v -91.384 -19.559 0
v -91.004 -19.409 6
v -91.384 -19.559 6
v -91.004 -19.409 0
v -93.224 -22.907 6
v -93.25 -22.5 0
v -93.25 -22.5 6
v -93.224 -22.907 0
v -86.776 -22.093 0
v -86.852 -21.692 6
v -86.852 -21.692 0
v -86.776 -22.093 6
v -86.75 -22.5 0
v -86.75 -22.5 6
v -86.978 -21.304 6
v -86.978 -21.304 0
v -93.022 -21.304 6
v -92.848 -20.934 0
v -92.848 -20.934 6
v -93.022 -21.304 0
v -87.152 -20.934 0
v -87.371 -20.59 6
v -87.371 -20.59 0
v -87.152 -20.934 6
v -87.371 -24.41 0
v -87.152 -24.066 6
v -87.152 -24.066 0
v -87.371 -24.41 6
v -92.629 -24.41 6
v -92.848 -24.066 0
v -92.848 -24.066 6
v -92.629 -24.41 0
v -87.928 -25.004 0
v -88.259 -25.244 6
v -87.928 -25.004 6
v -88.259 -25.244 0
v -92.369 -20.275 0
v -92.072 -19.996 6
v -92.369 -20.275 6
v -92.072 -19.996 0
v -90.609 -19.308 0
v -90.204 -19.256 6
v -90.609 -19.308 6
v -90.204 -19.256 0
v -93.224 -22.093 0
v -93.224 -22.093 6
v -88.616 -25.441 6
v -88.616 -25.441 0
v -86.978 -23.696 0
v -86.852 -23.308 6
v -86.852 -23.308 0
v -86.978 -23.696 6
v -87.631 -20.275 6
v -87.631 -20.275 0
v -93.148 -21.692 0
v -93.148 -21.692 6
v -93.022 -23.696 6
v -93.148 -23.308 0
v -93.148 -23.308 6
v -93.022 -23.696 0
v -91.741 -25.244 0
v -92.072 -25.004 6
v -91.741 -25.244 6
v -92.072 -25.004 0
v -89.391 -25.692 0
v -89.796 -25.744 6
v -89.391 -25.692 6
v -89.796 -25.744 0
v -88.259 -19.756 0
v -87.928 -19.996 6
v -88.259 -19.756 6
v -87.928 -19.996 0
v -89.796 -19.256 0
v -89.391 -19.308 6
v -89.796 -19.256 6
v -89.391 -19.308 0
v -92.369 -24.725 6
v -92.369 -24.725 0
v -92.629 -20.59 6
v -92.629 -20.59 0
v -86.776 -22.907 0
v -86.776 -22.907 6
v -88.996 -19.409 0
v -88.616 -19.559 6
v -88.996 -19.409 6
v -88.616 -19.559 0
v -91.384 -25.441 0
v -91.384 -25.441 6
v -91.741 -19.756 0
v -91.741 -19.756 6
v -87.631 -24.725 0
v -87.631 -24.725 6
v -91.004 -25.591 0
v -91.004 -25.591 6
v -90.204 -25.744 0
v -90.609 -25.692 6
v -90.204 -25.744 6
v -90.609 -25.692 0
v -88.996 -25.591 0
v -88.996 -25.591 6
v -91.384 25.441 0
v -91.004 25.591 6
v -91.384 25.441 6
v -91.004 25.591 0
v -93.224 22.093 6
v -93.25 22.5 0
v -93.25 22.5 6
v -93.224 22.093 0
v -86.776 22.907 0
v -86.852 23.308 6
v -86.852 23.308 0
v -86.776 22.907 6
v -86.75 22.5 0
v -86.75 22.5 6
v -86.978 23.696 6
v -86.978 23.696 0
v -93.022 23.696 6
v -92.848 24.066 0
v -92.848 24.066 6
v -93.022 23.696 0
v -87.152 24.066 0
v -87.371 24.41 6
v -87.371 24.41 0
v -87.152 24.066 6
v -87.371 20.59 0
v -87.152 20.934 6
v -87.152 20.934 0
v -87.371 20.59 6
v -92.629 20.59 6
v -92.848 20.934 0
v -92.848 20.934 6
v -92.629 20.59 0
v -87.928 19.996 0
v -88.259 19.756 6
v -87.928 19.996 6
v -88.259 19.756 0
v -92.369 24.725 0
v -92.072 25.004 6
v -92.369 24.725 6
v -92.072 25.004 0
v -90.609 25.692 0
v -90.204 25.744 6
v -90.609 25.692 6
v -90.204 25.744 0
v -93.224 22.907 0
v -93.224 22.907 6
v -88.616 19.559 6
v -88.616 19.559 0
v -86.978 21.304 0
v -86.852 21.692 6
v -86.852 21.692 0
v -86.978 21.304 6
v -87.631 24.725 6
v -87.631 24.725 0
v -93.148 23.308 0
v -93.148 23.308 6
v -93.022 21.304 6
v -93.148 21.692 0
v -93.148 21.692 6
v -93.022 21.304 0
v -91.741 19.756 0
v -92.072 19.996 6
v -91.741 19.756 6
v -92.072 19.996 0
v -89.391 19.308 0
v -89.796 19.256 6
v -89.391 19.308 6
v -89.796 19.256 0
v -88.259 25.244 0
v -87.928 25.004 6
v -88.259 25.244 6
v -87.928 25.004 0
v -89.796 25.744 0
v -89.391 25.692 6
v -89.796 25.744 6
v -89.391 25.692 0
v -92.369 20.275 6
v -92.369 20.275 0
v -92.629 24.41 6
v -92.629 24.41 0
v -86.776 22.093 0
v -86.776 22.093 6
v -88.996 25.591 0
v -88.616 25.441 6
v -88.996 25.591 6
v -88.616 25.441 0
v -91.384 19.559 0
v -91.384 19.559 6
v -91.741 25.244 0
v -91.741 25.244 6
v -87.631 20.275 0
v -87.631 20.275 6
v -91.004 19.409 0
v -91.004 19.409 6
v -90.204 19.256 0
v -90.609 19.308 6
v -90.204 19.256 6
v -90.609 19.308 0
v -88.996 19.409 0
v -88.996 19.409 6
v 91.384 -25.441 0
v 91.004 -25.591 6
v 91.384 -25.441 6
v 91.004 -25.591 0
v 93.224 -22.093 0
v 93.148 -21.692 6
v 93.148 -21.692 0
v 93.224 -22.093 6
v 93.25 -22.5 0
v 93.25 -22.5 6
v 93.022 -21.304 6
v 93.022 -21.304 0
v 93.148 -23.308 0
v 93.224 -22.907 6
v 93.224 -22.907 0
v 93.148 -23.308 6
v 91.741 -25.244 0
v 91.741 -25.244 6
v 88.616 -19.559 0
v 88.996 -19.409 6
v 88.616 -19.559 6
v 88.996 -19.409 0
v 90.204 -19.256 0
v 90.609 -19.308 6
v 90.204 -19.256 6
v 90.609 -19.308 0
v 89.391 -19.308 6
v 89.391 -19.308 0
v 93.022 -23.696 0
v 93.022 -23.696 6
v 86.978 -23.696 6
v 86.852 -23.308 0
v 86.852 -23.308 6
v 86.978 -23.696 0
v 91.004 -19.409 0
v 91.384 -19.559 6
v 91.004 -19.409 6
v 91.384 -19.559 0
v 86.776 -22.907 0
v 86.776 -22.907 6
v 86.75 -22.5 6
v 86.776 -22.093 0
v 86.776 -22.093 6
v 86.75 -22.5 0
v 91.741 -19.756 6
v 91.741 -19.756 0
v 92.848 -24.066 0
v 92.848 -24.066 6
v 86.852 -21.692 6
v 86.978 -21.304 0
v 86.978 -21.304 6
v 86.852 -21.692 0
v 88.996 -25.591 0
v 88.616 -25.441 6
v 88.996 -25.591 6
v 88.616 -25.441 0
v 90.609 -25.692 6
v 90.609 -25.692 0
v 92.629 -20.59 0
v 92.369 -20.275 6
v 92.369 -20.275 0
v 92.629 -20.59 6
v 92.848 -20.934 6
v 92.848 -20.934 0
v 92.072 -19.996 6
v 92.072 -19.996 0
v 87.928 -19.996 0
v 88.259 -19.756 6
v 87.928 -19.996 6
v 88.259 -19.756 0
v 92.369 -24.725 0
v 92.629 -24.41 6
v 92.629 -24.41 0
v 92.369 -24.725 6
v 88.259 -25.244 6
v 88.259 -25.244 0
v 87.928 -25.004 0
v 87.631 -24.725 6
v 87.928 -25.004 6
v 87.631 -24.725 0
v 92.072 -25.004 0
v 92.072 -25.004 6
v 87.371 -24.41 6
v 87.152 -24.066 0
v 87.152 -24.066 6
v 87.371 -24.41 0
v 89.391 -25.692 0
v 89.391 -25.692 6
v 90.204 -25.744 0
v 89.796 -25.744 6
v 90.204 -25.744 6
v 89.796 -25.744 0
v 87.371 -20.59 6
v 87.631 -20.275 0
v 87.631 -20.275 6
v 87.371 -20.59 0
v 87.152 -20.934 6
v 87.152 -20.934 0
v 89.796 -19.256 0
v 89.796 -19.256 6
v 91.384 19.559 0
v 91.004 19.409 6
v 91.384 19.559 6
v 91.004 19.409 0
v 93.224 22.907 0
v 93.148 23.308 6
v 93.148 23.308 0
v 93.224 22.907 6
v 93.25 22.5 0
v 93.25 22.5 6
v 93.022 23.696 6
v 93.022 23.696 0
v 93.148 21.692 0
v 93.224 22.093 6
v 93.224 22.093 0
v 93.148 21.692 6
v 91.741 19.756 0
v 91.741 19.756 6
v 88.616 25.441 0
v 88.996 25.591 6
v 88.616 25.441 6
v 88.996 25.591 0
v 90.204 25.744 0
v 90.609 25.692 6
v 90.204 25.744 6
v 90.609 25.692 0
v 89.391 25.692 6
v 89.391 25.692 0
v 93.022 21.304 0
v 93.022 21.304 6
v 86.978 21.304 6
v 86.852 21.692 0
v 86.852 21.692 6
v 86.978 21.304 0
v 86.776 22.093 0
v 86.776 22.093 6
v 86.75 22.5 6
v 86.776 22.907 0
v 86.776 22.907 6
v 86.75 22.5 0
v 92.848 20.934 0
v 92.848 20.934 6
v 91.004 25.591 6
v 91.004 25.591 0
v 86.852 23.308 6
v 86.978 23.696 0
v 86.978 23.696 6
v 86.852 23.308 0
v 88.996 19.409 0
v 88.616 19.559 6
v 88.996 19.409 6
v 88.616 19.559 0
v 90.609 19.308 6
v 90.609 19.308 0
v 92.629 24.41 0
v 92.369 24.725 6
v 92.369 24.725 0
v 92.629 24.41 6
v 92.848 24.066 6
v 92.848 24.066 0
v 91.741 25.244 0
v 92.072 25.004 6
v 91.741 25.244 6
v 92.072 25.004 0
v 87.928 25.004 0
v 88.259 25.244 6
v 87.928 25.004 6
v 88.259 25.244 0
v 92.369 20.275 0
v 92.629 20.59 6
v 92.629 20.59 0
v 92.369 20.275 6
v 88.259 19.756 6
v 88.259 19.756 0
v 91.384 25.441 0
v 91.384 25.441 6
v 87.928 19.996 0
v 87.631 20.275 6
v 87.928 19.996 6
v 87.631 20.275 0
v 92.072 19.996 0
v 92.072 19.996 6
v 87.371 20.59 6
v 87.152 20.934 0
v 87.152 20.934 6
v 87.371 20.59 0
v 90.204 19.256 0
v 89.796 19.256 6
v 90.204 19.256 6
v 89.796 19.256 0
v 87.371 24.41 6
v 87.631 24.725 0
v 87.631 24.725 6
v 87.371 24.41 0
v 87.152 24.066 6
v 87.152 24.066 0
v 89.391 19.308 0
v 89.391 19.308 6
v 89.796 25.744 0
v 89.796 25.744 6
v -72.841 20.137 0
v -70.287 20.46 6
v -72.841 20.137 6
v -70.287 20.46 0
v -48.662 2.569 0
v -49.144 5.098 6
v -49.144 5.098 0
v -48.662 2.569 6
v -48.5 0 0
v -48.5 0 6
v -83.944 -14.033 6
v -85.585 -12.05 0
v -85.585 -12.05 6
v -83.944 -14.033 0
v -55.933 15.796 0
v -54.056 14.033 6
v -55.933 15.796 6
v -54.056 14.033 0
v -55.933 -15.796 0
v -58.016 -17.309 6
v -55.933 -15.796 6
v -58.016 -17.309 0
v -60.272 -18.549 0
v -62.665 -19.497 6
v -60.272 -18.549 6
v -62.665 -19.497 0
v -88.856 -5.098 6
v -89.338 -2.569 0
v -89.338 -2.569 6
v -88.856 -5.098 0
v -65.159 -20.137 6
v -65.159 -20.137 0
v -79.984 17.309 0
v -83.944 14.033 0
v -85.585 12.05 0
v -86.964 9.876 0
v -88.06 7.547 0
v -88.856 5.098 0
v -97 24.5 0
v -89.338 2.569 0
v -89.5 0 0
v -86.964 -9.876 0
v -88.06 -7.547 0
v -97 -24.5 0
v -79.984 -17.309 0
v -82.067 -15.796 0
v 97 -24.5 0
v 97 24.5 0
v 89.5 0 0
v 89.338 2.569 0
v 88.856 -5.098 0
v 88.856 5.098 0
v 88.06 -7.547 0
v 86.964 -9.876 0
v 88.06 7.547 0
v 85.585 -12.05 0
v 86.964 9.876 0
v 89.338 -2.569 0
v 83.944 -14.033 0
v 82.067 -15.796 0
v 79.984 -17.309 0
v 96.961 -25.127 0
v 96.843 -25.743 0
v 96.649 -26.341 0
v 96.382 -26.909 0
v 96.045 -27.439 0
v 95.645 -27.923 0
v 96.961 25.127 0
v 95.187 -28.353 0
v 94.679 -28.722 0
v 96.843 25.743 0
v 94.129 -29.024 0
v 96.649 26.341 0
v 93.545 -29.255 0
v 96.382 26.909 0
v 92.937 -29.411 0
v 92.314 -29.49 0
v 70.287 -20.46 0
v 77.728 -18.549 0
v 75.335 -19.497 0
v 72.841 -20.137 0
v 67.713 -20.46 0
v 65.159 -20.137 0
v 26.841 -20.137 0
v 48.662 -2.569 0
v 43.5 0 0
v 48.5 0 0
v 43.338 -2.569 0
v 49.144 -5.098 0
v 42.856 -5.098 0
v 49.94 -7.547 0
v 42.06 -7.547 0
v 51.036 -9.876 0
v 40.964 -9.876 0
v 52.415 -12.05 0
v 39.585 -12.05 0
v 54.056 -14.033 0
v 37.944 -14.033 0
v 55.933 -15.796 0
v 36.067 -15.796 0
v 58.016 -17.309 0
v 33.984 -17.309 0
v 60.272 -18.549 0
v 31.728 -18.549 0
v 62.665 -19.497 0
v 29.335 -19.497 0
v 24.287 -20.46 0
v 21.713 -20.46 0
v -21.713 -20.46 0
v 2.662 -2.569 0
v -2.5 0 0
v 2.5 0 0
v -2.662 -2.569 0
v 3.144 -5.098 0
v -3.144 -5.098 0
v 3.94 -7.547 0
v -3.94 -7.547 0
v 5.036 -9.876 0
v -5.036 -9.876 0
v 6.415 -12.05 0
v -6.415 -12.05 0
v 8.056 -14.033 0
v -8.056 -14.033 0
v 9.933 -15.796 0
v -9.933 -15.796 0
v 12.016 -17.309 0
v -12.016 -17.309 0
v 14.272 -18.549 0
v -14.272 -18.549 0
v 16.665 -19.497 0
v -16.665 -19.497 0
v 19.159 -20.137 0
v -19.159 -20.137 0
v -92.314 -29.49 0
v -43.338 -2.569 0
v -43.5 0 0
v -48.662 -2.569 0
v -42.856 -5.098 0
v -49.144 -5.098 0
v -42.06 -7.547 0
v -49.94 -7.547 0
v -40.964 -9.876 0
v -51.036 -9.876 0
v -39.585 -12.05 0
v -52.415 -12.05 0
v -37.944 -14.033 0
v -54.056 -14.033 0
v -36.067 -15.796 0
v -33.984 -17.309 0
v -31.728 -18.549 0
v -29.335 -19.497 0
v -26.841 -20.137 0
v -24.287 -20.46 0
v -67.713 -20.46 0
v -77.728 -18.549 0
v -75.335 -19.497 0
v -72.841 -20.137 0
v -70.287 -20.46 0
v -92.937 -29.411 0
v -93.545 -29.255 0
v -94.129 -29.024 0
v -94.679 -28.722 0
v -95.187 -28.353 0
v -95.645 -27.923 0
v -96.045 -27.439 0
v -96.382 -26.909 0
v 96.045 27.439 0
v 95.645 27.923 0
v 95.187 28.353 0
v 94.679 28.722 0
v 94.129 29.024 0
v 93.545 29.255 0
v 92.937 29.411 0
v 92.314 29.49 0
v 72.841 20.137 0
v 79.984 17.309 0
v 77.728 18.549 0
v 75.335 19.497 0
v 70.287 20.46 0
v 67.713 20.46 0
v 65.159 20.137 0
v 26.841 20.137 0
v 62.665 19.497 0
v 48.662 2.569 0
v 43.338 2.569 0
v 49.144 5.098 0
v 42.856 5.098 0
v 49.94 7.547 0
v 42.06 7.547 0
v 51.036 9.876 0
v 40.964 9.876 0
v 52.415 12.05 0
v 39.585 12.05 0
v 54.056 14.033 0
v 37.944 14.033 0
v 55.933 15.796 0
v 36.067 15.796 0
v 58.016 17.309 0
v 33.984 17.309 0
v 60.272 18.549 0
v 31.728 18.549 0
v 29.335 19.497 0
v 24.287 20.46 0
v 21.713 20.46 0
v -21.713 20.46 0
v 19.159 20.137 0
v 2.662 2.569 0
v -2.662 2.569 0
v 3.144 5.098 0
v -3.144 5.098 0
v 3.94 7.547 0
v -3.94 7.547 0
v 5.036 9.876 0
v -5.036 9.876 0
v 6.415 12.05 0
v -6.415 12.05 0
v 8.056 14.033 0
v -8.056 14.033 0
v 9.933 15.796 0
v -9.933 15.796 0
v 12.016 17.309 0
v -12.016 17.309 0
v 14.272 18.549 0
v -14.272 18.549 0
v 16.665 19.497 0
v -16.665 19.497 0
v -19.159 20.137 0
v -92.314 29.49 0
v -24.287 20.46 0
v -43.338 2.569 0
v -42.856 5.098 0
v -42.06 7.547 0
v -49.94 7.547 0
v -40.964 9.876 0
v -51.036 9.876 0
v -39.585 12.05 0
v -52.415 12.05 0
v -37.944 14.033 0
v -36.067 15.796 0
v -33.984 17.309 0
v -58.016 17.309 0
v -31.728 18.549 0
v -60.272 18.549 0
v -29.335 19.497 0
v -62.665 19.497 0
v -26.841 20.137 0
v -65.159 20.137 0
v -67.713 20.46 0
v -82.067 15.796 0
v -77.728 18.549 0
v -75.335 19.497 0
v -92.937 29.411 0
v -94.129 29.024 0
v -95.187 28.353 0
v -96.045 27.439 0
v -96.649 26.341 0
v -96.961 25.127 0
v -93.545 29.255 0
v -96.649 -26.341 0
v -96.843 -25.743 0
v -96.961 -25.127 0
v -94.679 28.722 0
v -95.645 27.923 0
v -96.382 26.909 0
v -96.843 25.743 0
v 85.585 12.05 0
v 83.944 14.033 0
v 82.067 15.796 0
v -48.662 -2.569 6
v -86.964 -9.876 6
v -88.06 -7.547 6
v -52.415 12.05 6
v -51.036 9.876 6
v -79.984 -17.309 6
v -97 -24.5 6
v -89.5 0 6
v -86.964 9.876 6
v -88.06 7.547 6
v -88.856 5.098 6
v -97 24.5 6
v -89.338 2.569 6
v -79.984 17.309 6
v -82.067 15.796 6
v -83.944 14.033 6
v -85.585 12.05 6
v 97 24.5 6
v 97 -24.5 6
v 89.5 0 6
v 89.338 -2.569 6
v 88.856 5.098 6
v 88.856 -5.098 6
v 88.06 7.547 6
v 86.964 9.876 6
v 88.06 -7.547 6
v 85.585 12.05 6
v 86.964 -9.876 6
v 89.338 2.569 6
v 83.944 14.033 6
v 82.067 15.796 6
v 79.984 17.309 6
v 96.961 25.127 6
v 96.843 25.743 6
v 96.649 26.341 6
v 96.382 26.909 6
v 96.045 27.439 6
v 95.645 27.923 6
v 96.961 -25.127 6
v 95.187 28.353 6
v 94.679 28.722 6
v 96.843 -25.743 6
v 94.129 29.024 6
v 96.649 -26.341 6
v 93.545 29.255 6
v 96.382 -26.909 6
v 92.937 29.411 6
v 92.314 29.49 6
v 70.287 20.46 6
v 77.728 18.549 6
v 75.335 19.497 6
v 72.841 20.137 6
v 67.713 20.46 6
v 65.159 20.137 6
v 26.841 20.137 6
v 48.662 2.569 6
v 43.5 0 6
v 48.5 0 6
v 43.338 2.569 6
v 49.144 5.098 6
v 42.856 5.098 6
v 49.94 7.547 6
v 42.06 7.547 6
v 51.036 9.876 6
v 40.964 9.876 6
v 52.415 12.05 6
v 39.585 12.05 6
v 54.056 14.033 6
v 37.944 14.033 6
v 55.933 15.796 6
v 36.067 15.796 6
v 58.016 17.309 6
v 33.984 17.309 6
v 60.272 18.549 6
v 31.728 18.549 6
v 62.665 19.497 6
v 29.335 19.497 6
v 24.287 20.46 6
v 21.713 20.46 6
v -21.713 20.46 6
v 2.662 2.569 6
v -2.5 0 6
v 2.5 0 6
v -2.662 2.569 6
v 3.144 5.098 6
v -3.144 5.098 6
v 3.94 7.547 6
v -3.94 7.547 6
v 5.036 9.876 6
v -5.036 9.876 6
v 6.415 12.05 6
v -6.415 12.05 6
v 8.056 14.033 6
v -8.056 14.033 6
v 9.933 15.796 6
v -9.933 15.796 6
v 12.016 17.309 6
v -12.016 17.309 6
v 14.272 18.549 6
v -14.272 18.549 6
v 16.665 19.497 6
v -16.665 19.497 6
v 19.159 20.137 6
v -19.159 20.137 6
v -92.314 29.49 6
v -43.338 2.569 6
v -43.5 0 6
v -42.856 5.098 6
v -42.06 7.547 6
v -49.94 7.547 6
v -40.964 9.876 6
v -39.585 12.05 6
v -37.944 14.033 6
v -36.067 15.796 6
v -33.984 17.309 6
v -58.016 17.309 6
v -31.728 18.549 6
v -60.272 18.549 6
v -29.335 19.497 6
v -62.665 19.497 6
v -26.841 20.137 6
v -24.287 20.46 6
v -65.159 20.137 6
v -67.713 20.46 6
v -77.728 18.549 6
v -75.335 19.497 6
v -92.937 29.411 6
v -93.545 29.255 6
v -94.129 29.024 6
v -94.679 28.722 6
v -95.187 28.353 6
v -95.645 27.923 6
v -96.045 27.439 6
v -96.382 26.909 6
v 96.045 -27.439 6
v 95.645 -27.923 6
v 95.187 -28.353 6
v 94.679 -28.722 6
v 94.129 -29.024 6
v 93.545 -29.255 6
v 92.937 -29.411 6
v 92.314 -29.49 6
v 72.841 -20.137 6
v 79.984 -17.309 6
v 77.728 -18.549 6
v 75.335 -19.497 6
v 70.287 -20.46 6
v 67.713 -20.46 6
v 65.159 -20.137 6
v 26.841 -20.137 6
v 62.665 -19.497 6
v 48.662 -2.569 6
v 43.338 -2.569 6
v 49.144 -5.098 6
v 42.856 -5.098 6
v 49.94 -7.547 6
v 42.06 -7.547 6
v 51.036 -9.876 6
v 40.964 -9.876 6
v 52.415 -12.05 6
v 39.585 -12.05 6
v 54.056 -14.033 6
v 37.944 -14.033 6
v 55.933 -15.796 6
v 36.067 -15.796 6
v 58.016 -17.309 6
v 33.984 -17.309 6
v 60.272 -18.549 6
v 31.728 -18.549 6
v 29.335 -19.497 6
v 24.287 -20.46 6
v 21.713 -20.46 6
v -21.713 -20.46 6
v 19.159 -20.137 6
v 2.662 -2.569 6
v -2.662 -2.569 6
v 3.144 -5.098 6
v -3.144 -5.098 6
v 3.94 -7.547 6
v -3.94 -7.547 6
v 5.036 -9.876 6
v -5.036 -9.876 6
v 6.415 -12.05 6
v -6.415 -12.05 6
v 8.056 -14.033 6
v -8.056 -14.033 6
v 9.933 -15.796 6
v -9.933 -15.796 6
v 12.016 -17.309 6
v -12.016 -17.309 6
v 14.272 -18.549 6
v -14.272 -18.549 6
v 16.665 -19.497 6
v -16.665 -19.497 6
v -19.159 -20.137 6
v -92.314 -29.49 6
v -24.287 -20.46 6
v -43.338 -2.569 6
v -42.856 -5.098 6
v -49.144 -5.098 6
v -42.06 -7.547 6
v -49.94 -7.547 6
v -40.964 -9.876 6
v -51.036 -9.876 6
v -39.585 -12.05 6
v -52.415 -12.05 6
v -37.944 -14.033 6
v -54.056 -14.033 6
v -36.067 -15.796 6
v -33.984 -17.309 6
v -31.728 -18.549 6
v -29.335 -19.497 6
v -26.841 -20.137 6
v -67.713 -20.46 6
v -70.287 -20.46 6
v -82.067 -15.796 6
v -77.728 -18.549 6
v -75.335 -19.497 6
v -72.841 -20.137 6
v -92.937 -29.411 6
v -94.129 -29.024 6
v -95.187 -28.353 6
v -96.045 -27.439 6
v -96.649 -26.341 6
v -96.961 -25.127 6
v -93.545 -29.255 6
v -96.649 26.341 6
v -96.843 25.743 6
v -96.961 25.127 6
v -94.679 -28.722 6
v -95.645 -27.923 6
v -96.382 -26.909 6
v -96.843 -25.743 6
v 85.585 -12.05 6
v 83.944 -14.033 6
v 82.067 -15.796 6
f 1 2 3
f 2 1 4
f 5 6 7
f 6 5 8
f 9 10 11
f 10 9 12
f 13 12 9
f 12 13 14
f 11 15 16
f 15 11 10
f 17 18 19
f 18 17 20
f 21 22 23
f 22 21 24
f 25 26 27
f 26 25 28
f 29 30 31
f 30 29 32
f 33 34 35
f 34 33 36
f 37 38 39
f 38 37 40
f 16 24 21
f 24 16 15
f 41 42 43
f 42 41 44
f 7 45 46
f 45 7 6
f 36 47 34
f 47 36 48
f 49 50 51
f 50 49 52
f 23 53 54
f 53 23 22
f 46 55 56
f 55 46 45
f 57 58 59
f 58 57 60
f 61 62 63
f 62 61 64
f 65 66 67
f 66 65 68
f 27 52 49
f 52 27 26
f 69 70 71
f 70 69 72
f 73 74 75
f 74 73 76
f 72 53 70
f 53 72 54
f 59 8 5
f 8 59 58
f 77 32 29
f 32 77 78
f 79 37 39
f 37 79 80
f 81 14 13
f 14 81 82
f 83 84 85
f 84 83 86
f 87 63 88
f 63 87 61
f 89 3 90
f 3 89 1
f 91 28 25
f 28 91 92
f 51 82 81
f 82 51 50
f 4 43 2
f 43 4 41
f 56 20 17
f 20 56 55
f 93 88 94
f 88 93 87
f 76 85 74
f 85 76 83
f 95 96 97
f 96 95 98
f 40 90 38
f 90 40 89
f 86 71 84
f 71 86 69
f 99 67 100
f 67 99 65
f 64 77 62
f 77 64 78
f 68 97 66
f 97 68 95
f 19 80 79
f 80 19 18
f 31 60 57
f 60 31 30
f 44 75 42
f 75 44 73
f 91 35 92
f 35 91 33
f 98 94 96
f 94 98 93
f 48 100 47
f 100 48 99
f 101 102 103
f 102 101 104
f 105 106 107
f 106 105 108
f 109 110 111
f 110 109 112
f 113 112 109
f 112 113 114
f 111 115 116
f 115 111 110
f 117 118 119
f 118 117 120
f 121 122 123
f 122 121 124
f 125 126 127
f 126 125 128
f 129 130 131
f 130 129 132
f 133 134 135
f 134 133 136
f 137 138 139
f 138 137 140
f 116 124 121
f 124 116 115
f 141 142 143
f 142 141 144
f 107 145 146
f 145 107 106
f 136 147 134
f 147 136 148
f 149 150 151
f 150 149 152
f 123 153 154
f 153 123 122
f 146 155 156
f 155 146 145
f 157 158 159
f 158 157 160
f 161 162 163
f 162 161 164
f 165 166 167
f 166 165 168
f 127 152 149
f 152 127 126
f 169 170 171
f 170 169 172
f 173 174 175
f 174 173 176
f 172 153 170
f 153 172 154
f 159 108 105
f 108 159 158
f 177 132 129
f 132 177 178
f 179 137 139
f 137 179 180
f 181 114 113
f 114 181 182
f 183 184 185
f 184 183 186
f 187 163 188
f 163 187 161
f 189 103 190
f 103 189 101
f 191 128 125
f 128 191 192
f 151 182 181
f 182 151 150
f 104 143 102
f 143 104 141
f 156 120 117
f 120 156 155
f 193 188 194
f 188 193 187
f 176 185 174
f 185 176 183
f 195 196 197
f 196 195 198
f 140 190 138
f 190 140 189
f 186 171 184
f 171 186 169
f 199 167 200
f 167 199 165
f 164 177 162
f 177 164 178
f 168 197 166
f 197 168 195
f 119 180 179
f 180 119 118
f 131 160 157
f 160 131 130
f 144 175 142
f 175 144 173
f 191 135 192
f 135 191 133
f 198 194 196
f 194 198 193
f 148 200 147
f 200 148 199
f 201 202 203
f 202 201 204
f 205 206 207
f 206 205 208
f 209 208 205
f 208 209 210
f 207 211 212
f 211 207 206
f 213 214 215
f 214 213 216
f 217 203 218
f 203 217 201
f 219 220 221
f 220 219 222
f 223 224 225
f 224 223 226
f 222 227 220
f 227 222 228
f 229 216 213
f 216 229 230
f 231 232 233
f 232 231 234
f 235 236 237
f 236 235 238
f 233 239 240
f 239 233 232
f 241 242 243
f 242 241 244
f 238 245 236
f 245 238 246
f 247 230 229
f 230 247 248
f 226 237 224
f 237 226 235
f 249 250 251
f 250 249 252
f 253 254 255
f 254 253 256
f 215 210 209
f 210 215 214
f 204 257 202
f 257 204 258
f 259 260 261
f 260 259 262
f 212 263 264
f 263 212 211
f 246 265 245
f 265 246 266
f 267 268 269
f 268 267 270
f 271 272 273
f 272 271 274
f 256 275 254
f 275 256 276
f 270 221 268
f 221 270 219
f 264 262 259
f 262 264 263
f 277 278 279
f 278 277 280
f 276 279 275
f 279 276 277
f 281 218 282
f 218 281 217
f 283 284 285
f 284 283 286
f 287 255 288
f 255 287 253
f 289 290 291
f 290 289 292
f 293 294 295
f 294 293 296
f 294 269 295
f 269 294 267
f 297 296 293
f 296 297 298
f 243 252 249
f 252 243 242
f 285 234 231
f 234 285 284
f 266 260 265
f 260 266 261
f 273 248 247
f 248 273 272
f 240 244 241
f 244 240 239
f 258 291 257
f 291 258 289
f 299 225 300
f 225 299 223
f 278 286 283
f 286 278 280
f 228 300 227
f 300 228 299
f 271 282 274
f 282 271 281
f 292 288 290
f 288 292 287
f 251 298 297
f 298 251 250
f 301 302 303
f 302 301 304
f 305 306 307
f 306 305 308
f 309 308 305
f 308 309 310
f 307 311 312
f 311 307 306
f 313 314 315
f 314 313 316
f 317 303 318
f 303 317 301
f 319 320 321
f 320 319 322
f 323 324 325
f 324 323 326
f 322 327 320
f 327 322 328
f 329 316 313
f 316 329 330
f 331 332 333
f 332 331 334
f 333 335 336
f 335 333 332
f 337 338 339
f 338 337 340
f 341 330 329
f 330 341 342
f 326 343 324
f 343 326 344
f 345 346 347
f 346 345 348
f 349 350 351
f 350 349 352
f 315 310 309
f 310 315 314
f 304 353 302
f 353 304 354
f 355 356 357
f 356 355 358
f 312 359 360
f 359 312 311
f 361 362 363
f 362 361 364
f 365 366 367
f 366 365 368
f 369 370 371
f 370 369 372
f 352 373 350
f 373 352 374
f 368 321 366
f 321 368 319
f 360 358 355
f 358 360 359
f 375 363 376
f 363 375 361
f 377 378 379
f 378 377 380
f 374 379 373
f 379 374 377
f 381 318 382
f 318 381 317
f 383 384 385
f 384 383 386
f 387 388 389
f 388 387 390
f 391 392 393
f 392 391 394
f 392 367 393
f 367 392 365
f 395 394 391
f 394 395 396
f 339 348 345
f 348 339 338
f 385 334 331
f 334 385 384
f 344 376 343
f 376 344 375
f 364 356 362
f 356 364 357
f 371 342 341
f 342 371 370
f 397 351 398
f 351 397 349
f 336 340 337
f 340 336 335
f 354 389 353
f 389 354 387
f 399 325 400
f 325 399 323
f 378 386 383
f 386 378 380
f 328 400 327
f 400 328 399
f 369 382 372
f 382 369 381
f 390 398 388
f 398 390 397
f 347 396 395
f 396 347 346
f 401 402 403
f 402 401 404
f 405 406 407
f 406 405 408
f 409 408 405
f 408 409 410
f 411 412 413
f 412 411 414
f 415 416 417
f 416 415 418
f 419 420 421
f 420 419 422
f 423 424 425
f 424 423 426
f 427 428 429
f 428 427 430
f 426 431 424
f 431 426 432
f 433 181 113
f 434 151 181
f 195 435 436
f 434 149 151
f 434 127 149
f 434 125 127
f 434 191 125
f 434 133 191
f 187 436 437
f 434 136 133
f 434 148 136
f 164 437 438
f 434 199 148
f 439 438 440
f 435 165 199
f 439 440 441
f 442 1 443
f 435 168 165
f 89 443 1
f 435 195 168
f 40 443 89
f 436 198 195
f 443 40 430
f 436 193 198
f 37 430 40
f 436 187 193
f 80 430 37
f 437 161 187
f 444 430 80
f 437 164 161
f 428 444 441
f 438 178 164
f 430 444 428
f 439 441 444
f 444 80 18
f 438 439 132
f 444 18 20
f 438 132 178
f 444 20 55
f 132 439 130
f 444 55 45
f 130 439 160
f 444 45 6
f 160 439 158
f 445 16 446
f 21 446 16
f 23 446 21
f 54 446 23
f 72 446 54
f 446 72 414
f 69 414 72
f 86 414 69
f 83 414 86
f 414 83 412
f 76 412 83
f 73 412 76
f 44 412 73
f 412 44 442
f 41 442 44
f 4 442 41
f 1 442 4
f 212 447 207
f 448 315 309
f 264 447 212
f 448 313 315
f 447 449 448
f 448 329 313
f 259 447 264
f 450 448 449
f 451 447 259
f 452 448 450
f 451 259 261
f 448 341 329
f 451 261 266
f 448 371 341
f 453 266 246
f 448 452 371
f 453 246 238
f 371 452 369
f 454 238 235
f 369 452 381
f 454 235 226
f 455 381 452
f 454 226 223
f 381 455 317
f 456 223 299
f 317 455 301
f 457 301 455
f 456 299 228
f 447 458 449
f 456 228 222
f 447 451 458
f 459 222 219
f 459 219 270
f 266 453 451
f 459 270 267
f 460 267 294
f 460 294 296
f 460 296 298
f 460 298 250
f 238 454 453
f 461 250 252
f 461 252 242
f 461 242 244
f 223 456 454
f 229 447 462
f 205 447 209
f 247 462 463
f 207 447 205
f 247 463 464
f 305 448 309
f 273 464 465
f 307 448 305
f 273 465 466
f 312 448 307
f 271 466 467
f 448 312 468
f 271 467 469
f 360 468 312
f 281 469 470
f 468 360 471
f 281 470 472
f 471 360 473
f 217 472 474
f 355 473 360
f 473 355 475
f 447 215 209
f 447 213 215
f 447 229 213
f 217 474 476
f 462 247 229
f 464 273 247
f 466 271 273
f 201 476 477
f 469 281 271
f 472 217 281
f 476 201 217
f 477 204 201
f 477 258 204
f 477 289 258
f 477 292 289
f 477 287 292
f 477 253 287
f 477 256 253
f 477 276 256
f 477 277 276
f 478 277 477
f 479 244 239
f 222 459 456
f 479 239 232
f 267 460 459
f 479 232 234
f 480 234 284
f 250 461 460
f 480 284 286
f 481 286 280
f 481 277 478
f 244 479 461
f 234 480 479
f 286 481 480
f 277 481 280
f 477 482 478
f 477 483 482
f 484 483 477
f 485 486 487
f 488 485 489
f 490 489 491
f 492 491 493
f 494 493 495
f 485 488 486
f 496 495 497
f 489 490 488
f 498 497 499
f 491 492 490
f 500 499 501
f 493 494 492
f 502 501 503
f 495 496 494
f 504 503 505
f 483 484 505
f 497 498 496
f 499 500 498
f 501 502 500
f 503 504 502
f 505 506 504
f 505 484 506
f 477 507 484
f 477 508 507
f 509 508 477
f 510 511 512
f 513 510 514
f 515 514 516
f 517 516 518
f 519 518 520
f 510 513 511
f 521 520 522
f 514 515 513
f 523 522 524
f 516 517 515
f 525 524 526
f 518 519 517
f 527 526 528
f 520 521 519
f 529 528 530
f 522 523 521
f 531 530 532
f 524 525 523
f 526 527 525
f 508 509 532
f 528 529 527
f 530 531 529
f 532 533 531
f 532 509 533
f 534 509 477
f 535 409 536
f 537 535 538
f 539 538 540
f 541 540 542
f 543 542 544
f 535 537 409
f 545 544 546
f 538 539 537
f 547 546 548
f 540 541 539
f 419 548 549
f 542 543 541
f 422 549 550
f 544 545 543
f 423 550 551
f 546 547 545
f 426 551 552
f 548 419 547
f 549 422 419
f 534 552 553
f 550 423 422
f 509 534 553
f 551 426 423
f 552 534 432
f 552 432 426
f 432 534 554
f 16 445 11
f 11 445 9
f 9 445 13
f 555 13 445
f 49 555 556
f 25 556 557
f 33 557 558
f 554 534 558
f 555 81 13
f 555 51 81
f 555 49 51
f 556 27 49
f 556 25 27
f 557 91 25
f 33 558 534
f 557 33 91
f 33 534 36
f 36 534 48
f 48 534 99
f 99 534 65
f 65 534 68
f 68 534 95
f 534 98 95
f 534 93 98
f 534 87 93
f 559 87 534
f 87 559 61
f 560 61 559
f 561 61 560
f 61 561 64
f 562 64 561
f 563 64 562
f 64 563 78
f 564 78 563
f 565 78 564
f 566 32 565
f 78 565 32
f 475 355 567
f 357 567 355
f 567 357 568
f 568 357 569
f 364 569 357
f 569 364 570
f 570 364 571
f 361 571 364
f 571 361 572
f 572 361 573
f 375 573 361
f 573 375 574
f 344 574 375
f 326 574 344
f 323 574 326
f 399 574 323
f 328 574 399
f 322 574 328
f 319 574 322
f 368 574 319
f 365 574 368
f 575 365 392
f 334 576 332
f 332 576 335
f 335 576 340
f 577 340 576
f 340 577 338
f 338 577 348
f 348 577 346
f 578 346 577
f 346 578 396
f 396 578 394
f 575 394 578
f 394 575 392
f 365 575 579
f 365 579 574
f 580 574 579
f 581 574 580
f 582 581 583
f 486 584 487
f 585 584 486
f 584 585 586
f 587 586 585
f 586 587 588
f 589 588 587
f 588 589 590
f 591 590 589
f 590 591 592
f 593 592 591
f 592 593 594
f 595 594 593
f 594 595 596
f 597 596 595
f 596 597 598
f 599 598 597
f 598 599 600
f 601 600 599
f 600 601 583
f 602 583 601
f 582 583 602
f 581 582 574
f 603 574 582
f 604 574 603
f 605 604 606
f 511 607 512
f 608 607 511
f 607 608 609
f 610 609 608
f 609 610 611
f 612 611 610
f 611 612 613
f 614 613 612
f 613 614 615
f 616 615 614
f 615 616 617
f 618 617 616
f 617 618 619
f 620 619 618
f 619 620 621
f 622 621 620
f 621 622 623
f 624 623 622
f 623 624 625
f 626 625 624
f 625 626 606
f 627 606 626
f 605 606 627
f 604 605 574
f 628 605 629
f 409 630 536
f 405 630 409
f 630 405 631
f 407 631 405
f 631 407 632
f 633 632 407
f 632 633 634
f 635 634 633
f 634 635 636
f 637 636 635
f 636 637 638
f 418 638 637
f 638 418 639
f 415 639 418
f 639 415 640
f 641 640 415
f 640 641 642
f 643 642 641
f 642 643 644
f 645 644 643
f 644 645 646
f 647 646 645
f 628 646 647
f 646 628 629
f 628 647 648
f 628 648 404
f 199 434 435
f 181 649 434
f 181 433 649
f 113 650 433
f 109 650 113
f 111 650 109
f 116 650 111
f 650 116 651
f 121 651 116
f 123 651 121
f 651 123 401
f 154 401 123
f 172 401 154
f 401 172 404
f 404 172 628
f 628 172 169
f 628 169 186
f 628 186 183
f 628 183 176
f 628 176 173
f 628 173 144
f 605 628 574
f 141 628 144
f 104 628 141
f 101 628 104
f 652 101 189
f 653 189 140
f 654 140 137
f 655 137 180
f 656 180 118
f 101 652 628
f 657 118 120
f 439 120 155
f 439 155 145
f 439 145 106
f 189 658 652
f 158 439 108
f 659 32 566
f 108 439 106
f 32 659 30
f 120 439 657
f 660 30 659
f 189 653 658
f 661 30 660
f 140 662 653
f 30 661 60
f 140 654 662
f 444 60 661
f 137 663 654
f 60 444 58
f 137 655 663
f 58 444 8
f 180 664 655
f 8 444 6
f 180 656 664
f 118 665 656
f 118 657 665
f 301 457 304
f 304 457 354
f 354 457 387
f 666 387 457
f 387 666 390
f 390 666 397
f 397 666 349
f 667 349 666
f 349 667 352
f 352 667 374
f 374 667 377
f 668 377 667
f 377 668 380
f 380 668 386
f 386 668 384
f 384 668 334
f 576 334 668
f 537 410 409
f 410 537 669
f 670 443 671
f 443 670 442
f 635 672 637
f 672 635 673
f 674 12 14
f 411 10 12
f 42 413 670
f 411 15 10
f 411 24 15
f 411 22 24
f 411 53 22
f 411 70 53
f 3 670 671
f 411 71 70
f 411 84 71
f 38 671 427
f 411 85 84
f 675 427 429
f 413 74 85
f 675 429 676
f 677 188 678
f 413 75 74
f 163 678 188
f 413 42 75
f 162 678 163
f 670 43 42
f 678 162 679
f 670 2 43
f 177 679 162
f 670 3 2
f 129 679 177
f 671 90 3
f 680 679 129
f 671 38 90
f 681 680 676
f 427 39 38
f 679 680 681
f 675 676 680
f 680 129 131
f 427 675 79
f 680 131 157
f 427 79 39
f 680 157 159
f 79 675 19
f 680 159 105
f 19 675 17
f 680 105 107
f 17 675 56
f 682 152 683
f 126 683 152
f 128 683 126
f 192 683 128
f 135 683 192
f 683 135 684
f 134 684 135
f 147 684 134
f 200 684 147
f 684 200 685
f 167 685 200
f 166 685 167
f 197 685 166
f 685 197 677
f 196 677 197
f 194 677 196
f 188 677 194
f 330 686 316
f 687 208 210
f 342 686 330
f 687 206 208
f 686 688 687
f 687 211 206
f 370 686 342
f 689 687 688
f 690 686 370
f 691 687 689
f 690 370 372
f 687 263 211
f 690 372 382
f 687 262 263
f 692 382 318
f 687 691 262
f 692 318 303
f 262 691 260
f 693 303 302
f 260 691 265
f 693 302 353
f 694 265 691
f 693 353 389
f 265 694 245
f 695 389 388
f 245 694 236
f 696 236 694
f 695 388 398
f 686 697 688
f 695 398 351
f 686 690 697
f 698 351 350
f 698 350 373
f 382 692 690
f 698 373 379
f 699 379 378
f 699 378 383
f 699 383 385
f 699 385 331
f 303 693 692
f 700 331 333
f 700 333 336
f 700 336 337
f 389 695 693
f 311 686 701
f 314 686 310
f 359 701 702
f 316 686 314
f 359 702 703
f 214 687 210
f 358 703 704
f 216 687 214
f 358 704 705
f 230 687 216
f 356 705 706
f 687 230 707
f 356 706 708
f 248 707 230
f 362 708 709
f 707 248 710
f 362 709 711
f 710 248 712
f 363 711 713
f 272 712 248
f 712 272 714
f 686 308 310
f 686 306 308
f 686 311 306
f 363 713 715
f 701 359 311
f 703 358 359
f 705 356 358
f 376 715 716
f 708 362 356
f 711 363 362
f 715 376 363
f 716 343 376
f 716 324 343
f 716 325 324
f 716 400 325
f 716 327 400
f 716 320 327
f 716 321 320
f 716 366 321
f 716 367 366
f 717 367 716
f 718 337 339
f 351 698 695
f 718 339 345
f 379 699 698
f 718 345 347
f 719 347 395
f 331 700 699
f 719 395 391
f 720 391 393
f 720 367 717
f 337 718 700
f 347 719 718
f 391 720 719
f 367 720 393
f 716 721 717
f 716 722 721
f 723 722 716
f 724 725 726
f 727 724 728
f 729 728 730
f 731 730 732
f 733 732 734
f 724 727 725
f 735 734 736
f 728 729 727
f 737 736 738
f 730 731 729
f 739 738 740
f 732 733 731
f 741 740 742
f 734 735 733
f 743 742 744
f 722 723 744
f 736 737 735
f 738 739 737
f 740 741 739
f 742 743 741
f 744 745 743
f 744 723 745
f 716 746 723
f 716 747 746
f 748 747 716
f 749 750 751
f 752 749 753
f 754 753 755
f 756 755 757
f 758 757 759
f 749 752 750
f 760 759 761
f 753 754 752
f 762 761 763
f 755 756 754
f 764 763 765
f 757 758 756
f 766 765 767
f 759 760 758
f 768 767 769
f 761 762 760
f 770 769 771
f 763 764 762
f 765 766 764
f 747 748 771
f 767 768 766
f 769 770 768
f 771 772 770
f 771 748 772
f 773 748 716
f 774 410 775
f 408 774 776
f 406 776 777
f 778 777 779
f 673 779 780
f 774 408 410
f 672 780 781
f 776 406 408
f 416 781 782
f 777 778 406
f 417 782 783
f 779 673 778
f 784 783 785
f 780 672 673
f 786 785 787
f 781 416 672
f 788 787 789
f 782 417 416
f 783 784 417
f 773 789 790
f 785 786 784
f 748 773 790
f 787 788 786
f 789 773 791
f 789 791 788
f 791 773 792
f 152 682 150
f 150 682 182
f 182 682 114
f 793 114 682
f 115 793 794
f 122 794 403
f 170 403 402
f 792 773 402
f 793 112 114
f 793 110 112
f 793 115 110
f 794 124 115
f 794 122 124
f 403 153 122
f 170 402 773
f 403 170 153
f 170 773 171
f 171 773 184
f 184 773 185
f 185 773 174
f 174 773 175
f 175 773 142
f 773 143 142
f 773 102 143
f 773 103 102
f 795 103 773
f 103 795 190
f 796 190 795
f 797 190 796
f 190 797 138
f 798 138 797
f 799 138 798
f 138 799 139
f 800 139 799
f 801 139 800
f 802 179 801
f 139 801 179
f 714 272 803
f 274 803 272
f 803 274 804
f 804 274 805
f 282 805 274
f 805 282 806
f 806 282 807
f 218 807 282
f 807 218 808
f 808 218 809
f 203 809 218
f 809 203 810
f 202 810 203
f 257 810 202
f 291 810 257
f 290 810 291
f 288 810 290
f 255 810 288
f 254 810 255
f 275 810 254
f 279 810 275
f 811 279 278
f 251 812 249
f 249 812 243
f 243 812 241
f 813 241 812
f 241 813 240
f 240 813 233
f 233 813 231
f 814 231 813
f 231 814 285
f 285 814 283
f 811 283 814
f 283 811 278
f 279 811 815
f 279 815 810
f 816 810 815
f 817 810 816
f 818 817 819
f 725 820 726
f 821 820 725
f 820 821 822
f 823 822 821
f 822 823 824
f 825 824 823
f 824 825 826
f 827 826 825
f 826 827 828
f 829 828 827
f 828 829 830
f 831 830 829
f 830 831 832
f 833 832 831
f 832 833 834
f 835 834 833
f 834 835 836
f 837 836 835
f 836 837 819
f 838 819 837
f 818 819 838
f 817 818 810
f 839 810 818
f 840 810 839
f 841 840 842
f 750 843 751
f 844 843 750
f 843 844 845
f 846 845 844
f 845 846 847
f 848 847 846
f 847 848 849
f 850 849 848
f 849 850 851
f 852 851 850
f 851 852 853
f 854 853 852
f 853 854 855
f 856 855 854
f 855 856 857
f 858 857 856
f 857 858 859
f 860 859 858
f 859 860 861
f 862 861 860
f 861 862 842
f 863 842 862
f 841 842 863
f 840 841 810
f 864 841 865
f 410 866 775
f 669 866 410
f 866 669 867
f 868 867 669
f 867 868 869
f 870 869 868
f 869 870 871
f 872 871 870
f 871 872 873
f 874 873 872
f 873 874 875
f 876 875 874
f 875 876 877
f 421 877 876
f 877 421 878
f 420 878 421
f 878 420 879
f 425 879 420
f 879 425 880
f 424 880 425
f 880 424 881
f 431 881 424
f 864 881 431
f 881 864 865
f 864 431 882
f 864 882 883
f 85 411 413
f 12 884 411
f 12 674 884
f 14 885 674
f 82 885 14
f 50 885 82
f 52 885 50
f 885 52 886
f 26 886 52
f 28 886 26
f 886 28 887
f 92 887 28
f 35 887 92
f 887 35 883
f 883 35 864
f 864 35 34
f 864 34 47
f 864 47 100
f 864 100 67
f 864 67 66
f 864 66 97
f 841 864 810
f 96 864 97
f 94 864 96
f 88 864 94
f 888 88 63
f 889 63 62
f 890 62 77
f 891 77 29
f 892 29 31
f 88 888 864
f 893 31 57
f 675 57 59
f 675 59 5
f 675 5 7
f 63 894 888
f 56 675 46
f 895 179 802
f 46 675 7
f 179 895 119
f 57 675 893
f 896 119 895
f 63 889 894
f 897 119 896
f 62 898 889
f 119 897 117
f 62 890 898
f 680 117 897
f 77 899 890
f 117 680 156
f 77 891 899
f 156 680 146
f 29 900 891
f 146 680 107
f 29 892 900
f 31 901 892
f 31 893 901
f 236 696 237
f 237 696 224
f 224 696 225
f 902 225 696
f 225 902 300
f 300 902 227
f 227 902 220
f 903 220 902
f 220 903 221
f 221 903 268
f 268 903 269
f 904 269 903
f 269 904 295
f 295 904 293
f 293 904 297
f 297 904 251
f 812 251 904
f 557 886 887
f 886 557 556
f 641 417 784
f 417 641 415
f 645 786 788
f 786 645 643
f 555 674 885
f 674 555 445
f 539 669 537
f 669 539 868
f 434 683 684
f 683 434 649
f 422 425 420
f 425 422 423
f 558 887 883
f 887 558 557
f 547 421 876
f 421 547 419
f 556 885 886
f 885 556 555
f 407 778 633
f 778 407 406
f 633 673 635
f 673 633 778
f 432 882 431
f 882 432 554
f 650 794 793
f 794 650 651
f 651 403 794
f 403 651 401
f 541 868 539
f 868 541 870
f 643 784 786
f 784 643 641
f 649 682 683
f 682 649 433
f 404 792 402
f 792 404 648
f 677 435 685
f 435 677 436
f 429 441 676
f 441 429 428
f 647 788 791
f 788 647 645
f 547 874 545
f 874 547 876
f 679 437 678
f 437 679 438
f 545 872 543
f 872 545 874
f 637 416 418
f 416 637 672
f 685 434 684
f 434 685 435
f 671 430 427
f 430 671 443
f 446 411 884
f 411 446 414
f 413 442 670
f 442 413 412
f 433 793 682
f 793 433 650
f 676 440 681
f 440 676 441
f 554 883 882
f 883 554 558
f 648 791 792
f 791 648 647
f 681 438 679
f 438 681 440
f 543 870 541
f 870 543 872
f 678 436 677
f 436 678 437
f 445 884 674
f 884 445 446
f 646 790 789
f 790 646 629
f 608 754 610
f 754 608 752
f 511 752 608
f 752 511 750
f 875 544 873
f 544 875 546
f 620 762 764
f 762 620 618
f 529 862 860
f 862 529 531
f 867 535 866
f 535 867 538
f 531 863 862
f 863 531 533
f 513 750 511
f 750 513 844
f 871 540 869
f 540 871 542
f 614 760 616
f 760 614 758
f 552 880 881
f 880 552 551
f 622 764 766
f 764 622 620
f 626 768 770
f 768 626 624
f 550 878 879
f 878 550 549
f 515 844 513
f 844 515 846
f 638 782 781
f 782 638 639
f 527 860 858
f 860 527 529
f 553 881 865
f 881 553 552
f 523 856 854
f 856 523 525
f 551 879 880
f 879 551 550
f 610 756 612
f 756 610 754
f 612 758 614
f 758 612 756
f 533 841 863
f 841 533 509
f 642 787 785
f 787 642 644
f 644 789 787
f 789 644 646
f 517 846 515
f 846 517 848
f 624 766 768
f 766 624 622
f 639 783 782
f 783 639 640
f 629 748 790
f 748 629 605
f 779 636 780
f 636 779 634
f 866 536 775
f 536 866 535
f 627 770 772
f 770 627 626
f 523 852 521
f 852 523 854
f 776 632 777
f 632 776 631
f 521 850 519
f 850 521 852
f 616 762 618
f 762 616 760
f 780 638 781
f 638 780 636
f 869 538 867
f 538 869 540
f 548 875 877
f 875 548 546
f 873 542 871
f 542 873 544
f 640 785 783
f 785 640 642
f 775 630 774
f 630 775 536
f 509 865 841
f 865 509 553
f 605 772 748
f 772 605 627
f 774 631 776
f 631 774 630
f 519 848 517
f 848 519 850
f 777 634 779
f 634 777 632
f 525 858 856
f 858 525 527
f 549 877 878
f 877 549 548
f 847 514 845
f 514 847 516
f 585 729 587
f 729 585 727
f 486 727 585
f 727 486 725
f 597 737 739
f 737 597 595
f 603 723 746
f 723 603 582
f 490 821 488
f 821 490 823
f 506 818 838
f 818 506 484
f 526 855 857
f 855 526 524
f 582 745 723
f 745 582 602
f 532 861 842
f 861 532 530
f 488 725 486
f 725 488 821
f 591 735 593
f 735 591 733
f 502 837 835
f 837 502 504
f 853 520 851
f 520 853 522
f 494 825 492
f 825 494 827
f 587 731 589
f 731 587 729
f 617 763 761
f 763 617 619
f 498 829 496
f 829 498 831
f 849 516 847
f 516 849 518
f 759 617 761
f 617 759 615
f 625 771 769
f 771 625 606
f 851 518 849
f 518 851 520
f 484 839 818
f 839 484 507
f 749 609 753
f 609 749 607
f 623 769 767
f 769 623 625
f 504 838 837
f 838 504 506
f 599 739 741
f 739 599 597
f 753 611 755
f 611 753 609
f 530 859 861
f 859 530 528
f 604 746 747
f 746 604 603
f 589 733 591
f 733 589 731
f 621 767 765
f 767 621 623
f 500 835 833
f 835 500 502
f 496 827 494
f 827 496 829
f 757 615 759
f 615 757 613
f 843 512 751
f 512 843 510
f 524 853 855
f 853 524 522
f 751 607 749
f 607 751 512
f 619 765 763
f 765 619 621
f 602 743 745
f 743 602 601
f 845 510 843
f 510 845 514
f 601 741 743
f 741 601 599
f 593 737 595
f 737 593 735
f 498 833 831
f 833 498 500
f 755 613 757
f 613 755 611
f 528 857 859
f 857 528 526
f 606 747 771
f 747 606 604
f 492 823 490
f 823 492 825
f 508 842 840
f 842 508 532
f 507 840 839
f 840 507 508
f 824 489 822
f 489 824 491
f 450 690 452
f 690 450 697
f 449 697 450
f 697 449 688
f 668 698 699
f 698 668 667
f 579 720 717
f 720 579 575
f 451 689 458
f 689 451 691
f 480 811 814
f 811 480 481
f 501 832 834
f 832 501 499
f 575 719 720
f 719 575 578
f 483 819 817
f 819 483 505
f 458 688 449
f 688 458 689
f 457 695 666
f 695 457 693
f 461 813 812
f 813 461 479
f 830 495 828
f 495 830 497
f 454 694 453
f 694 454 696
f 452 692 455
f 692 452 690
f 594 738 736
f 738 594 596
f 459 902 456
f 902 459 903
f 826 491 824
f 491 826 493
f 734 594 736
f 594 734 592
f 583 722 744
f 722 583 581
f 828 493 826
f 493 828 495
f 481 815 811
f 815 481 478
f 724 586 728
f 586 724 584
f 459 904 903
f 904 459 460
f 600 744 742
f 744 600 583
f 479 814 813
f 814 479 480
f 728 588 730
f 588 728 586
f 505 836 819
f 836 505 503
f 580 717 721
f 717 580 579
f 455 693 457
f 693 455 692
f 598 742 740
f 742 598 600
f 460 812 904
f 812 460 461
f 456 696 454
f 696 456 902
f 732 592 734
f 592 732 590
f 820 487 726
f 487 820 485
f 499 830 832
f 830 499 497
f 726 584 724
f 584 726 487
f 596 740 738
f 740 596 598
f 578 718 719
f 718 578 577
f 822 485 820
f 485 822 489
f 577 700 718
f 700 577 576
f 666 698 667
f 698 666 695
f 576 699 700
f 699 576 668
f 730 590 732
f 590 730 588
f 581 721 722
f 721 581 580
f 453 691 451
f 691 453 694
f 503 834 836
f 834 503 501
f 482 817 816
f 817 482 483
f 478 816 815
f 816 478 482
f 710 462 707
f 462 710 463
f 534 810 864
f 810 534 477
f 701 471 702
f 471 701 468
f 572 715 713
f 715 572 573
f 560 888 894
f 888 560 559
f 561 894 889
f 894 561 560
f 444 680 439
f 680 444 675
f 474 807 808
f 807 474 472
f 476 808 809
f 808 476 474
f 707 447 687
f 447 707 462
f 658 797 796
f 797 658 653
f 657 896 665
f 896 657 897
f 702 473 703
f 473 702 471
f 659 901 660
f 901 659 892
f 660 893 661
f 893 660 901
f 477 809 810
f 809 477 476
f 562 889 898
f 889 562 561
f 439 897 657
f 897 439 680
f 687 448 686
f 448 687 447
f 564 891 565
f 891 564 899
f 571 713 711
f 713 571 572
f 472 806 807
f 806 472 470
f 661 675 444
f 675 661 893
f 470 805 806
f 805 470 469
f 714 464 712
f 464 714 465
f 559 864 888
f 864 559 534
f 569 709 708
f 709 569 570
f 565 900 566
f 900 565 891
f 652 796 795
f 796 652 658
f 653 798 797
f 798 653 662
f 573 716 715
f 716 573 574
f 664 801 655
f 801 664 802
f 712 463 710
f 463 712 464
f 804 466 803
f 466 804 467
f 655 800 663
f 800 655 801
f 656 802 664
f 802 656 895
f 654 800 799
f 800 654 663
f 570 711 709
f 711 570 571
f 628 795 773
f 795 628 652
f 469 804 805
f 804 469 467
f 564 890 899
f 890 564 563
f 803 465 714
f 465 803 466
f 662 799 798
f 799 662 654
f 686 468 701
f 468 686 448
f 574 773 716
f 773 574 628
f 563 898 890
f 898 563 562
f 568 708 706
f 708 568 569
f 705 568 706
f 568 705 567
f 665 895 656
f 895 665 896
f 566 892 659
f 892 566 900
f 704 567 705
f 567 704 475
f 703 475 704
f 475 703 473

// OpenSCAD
$fn = 50;

difference() {
	union() {
		hull() {
			translate(v = [-92.0, 24.5, 0]) {
				cylinder(h = 6, r = 5);
			}
			translate(v = [92.0, 24.5, 0]) {
				cylinder(h = 6, r = 5);
			}
			translate(v = [-92.0, -24.5, 0]) {
				cylinder(h = 6, r = 5);
			}
			translate(v = [92.0, -24.5, 0]) {
				cylinder(h = 6, r = 5);
			}
		}
	}
	union() {
		translate(v = [-90.0, -22.5, -100.0]) {
			cylinder(h = 200, r = 3.25);
		}
		translate(v = [-90.0, 22.5, -100.0]) {
			cylinder(h = 200, r = 3.25);
		}
		translate(v = [90.0, -22.5, -100.0]) {
			cylinder(h = 200, r = 3.25);
		}
		translate(v = [90.0, 22.5, -100.0]) {
			cylinder(h = 200, r = 3.25);
		}
		translate(v = [-90.0, -22.5, -100.0]) {
			cylinder(h = 200, r = 1.8);
		}
		translate(v = [-90.0, 22.5, -100.0]) {
			cylinder(h = 200, r = 1.8);
		}
		translate(v = [90.0, -22.5, -100.0]) {
			cylinder(h = 200, r = 1.8);
		}
		translate(v = [90.0, 22.5, -100.0]) {
			cylinder(h = 200, r = 1.8);
		}
		translate(v = [-69.0, 0, 0.0]) {
			cylinder(h = 6, r = 20.5);
		}
		translate(v = [-23.0, 0, 0.0]) {
			cylinder(h = 6, r = 20.5);
		}
		translate(v = [23.0, 0, 0.0]) {
			cylinder(h = 6, r = 20.5);
		}
		translate(v = [69.0, 0, 0.0]) {
			cylinder(h = 6, r = 20.5);
		}
	}
}
